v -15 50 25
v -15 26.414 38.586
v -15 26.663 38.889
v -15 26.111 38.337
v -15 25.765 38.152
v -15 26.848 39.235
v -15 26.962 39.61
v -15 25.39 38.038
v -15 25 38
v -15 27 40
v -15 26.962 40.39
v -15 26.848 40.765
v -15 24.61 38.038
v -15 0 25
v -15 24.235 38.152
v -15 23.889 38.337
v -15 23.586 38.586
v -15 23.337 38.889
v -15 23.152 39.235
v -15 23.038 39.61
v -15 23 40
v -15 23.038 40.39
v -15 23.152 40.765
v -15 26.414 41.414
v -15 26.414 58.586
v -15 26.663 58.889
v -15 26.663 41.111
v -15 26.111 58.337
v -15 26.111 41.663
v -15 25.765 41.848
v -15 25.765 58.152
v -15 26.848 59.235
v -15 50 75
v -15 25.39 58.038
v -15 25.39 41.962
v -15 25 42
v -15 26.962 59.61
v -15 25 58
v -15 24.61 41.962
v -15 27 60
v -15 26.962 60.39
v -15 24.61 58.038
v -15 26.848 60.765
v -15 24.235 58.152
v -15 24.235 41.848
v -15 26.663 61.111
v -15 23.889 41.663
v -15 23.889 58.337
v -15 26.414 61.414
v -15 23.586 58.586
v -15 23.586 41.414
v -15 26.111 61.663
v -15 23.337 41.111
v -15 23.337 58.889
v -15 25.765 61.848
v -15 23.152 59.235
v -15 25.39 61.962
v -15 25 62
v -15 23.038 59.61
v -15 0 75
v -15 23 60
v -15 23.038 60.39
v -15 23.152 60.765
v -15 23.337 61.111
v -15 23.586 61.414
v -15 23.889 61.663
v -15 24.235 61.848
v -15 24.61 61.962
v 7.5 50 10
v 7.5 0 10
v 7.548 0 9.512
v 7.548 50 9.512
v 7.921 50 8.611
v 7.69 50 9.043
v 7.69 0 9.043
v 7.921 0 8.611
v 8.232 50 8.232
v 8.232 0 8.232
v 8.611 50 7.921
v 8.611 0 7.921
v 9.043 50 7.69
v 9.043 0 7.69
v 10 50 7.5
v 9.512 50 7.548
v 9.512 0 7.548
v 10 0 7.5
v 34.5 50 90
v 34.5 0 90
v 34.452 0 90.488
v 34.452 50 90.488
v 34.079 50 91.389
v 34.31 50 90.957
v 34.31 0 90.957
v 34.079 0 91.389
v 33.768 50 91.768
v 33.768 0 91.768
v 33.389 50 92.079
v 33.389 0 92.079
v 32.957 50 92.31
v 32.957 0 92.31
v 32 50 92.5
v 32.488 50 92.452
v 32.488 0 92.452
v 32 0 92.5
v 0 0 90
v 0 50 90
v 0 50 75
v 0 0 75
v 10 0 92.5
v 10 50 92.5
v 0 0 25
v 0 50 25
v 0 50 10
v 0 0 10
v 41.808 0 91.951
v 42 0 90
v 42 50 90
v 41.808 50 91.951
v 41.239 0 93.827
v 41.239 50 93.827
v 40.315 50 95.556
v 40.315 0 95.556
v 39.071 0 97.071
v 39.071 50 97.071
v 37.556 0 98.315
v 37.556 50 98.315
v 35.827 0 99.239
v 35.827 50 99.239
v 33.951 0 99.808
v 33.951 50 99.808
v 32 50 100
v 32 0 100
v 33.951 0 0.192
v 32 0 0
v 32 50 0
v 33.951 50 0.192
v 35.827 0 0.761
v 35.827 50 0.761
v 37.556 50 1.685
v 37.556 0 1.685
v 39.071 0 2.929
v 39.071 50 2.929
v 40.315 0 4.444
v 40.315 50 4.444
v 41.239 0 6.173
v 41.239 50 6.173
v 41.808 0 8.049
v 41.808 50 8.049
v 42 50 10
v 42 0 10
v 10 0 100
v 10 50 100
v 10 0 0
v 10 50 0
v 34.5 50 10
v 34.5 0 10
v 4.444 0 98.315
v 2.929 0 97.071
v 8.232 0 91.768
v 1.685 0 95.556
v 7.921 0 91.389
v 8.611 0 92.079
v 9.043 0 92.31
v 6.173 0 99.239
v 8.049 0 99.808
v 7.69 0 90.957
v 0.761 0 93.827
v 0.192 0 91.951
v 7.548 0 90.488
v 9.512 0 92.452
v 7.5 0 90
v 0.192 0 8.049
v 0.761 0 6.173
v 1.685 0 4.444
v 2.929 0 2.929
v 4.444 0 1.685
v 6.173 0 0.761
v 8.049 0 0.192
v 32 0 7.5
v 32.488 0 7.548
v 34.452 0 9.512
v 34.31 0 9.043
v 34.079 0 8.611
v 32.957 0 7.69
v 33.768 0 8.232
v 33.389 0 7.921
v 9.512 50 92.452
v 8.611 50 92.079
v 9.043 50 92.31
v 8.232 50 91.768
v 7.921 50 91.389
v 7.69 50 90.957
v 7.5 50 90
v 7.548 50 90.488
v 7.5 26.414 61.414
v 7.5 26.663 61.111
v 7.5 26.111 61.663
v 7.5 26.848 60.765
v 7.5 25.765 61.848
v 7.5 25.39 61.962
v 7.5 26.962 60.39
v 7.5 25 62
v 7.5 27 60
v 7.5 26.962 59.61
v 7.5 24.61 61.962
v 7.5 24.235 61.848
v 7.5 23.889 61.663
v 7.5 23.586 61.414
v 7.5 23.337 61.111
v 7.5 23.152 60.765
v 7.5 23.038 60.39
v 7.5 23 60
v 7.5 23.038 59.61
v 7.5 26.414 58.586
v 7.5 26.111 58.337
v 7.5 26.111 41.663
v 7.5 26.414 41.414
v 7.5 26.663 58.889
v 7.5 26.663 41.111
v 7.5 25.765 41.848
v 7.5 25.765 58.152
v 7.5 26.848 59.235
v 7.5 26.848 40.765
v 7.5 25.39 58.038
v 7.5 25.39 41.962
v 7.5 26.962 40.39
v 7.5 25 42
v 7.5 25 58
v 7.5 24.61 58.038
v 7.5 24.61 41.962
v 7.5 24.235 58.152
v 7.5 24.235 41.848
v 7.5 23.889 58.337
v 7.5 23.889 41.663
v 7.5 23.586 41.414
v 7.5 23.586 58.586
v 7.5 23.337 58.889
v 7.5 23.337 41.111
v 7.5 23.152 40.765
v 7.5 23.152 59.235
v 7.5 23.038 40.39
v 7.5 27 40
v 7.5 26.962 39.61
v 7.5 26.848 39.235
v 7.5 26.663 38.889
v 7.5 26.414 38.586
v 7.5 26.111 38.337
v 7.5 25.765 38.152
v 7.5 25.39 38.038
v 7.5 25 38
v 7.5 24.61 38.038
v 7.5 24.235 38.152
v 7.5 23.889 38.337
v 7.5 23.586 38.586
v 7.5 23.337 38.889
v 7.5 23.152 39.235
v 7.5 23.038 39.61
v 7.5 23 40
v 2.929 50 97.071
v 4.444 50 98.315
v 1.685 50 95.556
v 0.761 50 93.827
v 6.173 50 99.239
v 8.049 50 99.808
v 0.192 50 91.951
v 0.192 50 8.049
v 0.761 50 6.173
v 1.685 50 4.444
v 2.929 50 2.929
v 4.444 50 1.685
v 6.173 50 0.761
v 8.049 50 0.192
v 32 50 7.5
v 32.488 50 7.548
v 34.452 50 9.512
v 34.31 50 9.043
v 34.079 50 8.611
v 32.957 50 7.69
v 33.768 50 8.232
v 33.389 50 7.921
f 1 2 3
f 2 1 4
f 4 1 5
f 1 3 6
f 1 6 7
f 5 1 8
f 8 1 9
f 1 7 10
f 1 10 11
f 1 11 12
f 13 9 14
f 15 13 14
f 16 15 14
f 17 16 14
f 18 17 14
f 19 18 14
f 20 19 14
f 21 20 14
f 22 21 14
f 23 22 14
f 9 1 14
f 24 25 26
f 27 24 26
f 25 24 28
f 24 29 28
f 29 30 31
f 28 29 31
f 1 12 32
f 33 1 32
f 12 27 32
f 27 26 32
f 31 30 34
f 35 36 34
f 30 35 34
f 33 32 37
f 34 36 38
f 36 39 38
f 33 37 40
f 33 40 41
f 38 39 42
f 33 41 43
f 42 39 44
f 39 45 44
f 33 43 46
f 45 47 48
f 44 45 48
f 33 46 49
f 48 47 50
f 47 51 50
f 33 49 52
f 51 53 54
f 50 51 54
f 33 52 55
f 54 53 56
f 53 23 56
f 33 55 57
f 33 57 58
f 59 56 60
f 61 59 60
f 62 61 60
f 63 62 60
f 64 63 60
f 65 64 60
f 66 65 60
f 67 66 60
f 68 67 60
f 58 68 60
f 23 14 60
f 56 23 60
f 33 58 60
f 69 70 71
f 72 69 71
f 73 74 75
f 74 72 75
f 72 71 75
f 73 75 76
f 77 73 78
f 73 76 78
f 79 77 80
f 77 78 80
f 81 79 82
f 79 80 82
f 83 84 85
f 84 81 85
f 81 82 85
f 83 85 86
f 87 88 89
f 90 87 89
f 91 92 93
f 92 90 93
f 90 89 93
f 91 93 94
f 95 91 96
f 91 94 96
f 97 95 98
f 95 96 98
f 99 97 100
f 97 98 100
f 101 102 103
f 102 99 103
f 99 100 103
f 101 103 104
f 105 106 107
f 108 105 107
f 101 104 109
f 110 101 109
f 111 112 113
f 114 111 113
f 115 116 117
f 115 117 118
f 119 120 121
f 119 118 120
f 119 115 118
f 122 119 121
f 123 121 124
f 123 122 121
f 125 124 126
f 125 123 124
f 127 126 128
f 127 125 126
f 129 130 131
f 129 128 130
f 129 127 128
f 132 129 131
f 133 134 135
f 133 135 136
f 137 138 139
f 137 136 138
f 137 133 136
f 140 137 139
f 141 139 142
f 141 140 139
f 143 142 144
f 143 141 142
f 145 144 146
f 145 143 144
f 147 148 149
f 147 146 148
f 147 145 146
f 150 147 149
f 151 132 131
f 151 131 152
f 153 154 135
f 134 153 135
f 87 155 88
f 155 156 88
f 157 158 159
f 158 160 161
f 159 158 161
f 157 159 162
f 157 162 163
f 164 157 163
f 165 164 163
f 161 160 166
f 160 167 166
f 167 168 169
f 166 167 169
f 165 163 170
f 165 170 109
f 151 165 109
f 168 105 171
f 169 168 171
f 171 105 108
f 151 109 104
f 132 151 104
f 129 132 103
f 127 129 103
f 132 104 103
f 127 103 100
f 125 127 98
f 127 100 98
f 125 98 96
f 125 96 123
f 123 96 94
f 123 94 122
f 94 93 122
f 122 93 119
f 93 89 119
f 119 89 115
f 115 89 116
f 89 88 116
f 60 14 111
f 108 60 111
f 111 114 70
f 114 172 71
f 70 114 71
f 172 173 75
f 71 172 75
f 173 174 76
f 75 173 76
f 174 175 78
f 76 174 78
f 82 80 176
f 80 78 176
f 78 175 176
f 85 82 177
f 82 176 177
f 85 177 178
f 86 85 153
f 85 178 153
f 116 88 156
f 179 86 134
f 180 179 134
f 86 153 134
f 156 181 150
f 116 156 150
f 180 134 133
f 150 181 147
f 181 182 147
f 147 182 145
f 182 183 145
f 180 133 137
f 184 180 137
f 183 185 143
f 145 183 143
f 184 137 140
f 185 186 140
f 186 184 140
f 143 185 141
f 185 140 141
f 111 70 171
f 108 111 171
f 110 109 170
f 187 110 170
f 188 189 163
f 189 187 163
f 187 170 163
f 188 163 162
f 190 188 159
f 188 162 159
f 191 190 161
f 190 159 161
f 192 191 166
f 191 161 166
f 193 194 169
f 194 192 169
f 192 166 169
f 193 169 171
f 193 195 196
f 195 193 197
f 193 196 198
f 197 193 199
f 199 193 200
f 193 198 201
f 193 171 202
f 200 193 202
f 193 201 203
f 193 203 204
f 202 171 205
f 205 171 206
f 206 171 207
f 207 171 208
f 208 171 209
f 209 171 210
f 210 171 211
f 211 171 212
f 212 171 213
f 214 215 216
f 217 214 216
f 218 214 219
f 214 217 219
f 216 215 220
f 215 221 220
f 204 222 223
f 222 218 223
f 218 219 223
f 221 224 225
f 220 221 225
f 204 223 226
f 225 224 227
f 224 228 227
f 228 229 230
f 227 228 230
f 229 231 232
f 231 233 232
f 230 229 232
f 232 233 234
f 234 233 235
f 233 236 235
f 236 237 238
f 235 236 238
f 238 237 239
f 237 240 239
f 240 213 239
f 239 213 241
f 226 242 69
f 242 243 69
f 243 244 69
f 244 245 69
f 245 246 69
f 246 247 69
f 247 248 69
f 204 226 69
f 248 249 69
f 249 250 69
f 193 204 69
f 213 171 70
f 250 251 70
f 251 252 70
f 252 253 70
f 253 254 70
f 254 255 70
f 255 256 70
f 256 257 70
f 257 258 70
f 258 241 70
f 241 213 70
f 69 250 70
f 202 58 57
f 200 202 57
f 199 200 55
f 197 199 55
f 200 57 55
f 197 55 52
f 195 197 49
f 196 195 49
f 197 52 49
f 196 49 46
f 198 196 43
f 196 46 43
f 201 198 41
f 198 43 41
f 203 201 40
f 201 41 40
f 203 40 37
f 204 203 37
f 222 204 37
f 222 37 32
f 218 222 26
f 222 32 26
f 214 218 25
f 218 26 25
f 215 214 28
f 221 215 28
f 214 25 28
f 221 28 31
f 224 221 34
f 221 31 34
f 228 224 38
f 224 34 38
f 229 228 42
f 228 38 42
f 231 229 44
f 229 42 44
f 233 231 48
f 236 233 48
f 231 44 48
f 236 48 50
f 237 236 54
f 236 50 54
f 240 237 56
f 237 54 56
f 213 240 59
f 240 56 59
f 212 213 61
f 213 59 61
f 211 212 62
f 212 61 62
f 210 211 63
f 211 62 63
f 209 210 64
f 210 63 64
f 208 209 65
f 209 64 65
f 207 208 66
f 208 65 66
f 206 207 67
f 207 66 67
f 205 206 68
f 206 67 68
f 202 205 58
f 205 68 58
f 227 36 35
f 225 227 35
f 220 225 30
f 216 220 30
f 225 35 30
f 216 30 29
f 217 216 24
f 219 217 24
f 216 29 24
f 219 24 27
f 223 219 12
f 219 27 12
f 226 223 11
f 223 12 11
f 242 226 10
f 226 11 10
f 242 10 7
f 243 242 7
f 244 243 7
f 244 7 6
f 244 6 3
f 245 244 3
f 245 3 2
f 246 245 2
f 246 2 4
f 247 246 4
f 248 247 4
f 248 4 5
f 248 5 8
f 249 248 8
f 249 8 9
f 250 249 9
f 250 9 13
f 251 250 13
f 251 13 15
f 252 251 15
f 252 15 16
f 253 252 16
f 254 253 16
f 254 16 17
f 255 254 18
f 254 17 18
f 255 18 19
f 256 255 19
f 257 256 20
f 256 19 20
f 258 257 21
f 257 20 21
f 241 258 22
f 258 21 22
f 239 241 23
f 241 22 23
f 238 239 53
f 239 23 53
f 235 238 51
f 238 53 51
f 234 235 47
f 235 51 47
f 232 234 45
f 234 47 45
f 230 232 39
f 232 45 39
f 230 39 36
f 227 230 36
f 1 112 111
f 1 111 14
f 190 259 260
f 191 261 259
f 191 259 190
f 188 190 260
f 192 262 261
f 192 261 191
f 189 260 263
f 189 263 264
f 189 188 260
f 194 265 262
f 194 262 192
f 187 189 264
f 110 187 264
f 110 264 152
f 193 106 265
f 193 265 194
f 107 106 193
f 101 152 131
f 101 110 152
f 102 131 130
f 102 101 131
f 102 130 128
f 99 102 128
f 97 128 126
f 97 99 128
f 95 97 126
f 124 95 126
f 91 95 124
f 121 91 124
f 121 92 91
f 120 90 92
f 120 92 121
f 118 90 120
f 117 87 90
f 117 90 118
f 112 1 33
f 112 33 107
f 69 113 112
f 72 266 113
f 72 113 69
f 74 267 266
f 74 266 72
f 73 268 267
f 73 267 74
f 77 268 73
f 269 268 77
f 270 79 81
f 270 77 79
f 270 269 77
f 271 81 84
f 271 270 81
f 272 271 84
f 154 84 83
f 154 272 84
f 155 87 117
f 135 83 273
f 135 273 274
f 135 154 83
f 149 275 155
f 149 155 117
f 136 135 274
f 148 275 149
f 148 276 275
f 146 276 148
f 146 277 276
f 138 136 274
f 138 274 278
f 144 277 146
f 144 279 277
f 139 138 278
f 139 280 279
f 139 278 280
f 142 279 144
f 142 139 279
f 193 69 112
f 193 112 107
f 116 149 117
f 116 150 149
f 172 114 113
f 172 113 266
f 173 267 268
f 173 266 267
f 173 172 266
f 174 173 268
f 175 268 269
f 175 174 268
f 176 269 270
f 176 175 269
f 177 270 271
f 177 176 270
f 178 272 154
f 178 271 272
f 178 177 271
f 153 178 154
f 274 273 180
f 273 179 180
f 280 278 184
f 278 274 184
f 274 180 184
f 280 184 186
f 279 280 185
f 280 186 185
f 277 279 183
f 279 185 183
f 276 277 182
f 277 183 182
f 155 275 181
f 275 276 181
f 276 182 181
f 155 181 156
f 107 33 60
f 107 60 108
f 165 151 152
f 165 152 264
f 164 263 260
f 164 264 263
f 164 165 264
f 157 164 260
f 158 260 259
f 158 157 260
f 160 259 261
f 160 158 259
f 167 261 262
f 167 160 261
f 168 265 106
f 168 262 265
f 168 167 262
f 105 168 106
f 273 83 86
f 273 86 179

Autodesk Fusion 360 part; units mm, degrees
sketch "Sketch1" plane through (0, 0, 0) normal (1, 0, 0) x (0, 0, -1)
sketch "Sketch2" plane through (0, 0, 0) normal (0, 1, 0) x (1, 0, 0)
  line L0 (10, 0) -> (32, 0)
  line L1 (42, -10) -> (42, -90)
  line L2 (32, -100) -> (10, -100)
  line L3 (0, -25) -> (-15, -25)
  line L4 (-15, -25) -> (-15, -75)
  line L5 (-15, -75) -> (0, -75)
  arc A0 (10, 0) -> (0, -10) centre (10, -10) ccw
  arc A1 (42, -10) -> (32, 0) centre (32, -10) ccw
  arc A2 (32, -100) -> (42, -90) centre (32, -90) ccw
  arc A3 (0, -90) -> (10, -100) centre (10, -90) ccw
  arc A4 (10, -7.5) -> (7.5, -10) centre (10, -10) ccw
  line L6 (7.5, -90) -> (7.5, -10)
  arc A5 (7.5, -90) -> (10, -92.5) centre (10, -90) ccw
  line L7 (32, -92.5) -> (10, -92.5)
  arc A6 (32, -92.5) -> (34.5, -90) centre (32, -90) ccw
  line L8 (34.5, -10) -> (34.5, -90)
  arc A7 (34.5, -10) -> (32, -7.5) centre (32, -10) ccw
  line L9 (10, -7.5) -> (32, -7.5)
  line L10 (0, -90) -> (0, -75)
  line L11 (0, -25) -> (0, -10)
  point P0 (42, 0)
  point P1 (0, -100)
  dimension "d11" = 42
extrude "Extrude1" add sketch "Sketch2" along normal blind 50
sketch "Sketch3" plane through (-15, 0, 0) normal (-1, 0, 0) x (0, 0, 1)
  line L0 (25, 0) -> (75, 0)
  line L1 (75, 0) -> (75, 50)
  line L2 (75, 50) -> (25, 50)
  line L3 (25, 50) -> (25, 0)
  circle A0 centre (40, 25) radius 2
  circle A1 centre (60, 25) radius 2
  dimension "d7" = 4
  dimension "d8" = 4
extrude "Extrude2" cut sketch "Sketch3" against normal blind 45 contours A0 | A1
